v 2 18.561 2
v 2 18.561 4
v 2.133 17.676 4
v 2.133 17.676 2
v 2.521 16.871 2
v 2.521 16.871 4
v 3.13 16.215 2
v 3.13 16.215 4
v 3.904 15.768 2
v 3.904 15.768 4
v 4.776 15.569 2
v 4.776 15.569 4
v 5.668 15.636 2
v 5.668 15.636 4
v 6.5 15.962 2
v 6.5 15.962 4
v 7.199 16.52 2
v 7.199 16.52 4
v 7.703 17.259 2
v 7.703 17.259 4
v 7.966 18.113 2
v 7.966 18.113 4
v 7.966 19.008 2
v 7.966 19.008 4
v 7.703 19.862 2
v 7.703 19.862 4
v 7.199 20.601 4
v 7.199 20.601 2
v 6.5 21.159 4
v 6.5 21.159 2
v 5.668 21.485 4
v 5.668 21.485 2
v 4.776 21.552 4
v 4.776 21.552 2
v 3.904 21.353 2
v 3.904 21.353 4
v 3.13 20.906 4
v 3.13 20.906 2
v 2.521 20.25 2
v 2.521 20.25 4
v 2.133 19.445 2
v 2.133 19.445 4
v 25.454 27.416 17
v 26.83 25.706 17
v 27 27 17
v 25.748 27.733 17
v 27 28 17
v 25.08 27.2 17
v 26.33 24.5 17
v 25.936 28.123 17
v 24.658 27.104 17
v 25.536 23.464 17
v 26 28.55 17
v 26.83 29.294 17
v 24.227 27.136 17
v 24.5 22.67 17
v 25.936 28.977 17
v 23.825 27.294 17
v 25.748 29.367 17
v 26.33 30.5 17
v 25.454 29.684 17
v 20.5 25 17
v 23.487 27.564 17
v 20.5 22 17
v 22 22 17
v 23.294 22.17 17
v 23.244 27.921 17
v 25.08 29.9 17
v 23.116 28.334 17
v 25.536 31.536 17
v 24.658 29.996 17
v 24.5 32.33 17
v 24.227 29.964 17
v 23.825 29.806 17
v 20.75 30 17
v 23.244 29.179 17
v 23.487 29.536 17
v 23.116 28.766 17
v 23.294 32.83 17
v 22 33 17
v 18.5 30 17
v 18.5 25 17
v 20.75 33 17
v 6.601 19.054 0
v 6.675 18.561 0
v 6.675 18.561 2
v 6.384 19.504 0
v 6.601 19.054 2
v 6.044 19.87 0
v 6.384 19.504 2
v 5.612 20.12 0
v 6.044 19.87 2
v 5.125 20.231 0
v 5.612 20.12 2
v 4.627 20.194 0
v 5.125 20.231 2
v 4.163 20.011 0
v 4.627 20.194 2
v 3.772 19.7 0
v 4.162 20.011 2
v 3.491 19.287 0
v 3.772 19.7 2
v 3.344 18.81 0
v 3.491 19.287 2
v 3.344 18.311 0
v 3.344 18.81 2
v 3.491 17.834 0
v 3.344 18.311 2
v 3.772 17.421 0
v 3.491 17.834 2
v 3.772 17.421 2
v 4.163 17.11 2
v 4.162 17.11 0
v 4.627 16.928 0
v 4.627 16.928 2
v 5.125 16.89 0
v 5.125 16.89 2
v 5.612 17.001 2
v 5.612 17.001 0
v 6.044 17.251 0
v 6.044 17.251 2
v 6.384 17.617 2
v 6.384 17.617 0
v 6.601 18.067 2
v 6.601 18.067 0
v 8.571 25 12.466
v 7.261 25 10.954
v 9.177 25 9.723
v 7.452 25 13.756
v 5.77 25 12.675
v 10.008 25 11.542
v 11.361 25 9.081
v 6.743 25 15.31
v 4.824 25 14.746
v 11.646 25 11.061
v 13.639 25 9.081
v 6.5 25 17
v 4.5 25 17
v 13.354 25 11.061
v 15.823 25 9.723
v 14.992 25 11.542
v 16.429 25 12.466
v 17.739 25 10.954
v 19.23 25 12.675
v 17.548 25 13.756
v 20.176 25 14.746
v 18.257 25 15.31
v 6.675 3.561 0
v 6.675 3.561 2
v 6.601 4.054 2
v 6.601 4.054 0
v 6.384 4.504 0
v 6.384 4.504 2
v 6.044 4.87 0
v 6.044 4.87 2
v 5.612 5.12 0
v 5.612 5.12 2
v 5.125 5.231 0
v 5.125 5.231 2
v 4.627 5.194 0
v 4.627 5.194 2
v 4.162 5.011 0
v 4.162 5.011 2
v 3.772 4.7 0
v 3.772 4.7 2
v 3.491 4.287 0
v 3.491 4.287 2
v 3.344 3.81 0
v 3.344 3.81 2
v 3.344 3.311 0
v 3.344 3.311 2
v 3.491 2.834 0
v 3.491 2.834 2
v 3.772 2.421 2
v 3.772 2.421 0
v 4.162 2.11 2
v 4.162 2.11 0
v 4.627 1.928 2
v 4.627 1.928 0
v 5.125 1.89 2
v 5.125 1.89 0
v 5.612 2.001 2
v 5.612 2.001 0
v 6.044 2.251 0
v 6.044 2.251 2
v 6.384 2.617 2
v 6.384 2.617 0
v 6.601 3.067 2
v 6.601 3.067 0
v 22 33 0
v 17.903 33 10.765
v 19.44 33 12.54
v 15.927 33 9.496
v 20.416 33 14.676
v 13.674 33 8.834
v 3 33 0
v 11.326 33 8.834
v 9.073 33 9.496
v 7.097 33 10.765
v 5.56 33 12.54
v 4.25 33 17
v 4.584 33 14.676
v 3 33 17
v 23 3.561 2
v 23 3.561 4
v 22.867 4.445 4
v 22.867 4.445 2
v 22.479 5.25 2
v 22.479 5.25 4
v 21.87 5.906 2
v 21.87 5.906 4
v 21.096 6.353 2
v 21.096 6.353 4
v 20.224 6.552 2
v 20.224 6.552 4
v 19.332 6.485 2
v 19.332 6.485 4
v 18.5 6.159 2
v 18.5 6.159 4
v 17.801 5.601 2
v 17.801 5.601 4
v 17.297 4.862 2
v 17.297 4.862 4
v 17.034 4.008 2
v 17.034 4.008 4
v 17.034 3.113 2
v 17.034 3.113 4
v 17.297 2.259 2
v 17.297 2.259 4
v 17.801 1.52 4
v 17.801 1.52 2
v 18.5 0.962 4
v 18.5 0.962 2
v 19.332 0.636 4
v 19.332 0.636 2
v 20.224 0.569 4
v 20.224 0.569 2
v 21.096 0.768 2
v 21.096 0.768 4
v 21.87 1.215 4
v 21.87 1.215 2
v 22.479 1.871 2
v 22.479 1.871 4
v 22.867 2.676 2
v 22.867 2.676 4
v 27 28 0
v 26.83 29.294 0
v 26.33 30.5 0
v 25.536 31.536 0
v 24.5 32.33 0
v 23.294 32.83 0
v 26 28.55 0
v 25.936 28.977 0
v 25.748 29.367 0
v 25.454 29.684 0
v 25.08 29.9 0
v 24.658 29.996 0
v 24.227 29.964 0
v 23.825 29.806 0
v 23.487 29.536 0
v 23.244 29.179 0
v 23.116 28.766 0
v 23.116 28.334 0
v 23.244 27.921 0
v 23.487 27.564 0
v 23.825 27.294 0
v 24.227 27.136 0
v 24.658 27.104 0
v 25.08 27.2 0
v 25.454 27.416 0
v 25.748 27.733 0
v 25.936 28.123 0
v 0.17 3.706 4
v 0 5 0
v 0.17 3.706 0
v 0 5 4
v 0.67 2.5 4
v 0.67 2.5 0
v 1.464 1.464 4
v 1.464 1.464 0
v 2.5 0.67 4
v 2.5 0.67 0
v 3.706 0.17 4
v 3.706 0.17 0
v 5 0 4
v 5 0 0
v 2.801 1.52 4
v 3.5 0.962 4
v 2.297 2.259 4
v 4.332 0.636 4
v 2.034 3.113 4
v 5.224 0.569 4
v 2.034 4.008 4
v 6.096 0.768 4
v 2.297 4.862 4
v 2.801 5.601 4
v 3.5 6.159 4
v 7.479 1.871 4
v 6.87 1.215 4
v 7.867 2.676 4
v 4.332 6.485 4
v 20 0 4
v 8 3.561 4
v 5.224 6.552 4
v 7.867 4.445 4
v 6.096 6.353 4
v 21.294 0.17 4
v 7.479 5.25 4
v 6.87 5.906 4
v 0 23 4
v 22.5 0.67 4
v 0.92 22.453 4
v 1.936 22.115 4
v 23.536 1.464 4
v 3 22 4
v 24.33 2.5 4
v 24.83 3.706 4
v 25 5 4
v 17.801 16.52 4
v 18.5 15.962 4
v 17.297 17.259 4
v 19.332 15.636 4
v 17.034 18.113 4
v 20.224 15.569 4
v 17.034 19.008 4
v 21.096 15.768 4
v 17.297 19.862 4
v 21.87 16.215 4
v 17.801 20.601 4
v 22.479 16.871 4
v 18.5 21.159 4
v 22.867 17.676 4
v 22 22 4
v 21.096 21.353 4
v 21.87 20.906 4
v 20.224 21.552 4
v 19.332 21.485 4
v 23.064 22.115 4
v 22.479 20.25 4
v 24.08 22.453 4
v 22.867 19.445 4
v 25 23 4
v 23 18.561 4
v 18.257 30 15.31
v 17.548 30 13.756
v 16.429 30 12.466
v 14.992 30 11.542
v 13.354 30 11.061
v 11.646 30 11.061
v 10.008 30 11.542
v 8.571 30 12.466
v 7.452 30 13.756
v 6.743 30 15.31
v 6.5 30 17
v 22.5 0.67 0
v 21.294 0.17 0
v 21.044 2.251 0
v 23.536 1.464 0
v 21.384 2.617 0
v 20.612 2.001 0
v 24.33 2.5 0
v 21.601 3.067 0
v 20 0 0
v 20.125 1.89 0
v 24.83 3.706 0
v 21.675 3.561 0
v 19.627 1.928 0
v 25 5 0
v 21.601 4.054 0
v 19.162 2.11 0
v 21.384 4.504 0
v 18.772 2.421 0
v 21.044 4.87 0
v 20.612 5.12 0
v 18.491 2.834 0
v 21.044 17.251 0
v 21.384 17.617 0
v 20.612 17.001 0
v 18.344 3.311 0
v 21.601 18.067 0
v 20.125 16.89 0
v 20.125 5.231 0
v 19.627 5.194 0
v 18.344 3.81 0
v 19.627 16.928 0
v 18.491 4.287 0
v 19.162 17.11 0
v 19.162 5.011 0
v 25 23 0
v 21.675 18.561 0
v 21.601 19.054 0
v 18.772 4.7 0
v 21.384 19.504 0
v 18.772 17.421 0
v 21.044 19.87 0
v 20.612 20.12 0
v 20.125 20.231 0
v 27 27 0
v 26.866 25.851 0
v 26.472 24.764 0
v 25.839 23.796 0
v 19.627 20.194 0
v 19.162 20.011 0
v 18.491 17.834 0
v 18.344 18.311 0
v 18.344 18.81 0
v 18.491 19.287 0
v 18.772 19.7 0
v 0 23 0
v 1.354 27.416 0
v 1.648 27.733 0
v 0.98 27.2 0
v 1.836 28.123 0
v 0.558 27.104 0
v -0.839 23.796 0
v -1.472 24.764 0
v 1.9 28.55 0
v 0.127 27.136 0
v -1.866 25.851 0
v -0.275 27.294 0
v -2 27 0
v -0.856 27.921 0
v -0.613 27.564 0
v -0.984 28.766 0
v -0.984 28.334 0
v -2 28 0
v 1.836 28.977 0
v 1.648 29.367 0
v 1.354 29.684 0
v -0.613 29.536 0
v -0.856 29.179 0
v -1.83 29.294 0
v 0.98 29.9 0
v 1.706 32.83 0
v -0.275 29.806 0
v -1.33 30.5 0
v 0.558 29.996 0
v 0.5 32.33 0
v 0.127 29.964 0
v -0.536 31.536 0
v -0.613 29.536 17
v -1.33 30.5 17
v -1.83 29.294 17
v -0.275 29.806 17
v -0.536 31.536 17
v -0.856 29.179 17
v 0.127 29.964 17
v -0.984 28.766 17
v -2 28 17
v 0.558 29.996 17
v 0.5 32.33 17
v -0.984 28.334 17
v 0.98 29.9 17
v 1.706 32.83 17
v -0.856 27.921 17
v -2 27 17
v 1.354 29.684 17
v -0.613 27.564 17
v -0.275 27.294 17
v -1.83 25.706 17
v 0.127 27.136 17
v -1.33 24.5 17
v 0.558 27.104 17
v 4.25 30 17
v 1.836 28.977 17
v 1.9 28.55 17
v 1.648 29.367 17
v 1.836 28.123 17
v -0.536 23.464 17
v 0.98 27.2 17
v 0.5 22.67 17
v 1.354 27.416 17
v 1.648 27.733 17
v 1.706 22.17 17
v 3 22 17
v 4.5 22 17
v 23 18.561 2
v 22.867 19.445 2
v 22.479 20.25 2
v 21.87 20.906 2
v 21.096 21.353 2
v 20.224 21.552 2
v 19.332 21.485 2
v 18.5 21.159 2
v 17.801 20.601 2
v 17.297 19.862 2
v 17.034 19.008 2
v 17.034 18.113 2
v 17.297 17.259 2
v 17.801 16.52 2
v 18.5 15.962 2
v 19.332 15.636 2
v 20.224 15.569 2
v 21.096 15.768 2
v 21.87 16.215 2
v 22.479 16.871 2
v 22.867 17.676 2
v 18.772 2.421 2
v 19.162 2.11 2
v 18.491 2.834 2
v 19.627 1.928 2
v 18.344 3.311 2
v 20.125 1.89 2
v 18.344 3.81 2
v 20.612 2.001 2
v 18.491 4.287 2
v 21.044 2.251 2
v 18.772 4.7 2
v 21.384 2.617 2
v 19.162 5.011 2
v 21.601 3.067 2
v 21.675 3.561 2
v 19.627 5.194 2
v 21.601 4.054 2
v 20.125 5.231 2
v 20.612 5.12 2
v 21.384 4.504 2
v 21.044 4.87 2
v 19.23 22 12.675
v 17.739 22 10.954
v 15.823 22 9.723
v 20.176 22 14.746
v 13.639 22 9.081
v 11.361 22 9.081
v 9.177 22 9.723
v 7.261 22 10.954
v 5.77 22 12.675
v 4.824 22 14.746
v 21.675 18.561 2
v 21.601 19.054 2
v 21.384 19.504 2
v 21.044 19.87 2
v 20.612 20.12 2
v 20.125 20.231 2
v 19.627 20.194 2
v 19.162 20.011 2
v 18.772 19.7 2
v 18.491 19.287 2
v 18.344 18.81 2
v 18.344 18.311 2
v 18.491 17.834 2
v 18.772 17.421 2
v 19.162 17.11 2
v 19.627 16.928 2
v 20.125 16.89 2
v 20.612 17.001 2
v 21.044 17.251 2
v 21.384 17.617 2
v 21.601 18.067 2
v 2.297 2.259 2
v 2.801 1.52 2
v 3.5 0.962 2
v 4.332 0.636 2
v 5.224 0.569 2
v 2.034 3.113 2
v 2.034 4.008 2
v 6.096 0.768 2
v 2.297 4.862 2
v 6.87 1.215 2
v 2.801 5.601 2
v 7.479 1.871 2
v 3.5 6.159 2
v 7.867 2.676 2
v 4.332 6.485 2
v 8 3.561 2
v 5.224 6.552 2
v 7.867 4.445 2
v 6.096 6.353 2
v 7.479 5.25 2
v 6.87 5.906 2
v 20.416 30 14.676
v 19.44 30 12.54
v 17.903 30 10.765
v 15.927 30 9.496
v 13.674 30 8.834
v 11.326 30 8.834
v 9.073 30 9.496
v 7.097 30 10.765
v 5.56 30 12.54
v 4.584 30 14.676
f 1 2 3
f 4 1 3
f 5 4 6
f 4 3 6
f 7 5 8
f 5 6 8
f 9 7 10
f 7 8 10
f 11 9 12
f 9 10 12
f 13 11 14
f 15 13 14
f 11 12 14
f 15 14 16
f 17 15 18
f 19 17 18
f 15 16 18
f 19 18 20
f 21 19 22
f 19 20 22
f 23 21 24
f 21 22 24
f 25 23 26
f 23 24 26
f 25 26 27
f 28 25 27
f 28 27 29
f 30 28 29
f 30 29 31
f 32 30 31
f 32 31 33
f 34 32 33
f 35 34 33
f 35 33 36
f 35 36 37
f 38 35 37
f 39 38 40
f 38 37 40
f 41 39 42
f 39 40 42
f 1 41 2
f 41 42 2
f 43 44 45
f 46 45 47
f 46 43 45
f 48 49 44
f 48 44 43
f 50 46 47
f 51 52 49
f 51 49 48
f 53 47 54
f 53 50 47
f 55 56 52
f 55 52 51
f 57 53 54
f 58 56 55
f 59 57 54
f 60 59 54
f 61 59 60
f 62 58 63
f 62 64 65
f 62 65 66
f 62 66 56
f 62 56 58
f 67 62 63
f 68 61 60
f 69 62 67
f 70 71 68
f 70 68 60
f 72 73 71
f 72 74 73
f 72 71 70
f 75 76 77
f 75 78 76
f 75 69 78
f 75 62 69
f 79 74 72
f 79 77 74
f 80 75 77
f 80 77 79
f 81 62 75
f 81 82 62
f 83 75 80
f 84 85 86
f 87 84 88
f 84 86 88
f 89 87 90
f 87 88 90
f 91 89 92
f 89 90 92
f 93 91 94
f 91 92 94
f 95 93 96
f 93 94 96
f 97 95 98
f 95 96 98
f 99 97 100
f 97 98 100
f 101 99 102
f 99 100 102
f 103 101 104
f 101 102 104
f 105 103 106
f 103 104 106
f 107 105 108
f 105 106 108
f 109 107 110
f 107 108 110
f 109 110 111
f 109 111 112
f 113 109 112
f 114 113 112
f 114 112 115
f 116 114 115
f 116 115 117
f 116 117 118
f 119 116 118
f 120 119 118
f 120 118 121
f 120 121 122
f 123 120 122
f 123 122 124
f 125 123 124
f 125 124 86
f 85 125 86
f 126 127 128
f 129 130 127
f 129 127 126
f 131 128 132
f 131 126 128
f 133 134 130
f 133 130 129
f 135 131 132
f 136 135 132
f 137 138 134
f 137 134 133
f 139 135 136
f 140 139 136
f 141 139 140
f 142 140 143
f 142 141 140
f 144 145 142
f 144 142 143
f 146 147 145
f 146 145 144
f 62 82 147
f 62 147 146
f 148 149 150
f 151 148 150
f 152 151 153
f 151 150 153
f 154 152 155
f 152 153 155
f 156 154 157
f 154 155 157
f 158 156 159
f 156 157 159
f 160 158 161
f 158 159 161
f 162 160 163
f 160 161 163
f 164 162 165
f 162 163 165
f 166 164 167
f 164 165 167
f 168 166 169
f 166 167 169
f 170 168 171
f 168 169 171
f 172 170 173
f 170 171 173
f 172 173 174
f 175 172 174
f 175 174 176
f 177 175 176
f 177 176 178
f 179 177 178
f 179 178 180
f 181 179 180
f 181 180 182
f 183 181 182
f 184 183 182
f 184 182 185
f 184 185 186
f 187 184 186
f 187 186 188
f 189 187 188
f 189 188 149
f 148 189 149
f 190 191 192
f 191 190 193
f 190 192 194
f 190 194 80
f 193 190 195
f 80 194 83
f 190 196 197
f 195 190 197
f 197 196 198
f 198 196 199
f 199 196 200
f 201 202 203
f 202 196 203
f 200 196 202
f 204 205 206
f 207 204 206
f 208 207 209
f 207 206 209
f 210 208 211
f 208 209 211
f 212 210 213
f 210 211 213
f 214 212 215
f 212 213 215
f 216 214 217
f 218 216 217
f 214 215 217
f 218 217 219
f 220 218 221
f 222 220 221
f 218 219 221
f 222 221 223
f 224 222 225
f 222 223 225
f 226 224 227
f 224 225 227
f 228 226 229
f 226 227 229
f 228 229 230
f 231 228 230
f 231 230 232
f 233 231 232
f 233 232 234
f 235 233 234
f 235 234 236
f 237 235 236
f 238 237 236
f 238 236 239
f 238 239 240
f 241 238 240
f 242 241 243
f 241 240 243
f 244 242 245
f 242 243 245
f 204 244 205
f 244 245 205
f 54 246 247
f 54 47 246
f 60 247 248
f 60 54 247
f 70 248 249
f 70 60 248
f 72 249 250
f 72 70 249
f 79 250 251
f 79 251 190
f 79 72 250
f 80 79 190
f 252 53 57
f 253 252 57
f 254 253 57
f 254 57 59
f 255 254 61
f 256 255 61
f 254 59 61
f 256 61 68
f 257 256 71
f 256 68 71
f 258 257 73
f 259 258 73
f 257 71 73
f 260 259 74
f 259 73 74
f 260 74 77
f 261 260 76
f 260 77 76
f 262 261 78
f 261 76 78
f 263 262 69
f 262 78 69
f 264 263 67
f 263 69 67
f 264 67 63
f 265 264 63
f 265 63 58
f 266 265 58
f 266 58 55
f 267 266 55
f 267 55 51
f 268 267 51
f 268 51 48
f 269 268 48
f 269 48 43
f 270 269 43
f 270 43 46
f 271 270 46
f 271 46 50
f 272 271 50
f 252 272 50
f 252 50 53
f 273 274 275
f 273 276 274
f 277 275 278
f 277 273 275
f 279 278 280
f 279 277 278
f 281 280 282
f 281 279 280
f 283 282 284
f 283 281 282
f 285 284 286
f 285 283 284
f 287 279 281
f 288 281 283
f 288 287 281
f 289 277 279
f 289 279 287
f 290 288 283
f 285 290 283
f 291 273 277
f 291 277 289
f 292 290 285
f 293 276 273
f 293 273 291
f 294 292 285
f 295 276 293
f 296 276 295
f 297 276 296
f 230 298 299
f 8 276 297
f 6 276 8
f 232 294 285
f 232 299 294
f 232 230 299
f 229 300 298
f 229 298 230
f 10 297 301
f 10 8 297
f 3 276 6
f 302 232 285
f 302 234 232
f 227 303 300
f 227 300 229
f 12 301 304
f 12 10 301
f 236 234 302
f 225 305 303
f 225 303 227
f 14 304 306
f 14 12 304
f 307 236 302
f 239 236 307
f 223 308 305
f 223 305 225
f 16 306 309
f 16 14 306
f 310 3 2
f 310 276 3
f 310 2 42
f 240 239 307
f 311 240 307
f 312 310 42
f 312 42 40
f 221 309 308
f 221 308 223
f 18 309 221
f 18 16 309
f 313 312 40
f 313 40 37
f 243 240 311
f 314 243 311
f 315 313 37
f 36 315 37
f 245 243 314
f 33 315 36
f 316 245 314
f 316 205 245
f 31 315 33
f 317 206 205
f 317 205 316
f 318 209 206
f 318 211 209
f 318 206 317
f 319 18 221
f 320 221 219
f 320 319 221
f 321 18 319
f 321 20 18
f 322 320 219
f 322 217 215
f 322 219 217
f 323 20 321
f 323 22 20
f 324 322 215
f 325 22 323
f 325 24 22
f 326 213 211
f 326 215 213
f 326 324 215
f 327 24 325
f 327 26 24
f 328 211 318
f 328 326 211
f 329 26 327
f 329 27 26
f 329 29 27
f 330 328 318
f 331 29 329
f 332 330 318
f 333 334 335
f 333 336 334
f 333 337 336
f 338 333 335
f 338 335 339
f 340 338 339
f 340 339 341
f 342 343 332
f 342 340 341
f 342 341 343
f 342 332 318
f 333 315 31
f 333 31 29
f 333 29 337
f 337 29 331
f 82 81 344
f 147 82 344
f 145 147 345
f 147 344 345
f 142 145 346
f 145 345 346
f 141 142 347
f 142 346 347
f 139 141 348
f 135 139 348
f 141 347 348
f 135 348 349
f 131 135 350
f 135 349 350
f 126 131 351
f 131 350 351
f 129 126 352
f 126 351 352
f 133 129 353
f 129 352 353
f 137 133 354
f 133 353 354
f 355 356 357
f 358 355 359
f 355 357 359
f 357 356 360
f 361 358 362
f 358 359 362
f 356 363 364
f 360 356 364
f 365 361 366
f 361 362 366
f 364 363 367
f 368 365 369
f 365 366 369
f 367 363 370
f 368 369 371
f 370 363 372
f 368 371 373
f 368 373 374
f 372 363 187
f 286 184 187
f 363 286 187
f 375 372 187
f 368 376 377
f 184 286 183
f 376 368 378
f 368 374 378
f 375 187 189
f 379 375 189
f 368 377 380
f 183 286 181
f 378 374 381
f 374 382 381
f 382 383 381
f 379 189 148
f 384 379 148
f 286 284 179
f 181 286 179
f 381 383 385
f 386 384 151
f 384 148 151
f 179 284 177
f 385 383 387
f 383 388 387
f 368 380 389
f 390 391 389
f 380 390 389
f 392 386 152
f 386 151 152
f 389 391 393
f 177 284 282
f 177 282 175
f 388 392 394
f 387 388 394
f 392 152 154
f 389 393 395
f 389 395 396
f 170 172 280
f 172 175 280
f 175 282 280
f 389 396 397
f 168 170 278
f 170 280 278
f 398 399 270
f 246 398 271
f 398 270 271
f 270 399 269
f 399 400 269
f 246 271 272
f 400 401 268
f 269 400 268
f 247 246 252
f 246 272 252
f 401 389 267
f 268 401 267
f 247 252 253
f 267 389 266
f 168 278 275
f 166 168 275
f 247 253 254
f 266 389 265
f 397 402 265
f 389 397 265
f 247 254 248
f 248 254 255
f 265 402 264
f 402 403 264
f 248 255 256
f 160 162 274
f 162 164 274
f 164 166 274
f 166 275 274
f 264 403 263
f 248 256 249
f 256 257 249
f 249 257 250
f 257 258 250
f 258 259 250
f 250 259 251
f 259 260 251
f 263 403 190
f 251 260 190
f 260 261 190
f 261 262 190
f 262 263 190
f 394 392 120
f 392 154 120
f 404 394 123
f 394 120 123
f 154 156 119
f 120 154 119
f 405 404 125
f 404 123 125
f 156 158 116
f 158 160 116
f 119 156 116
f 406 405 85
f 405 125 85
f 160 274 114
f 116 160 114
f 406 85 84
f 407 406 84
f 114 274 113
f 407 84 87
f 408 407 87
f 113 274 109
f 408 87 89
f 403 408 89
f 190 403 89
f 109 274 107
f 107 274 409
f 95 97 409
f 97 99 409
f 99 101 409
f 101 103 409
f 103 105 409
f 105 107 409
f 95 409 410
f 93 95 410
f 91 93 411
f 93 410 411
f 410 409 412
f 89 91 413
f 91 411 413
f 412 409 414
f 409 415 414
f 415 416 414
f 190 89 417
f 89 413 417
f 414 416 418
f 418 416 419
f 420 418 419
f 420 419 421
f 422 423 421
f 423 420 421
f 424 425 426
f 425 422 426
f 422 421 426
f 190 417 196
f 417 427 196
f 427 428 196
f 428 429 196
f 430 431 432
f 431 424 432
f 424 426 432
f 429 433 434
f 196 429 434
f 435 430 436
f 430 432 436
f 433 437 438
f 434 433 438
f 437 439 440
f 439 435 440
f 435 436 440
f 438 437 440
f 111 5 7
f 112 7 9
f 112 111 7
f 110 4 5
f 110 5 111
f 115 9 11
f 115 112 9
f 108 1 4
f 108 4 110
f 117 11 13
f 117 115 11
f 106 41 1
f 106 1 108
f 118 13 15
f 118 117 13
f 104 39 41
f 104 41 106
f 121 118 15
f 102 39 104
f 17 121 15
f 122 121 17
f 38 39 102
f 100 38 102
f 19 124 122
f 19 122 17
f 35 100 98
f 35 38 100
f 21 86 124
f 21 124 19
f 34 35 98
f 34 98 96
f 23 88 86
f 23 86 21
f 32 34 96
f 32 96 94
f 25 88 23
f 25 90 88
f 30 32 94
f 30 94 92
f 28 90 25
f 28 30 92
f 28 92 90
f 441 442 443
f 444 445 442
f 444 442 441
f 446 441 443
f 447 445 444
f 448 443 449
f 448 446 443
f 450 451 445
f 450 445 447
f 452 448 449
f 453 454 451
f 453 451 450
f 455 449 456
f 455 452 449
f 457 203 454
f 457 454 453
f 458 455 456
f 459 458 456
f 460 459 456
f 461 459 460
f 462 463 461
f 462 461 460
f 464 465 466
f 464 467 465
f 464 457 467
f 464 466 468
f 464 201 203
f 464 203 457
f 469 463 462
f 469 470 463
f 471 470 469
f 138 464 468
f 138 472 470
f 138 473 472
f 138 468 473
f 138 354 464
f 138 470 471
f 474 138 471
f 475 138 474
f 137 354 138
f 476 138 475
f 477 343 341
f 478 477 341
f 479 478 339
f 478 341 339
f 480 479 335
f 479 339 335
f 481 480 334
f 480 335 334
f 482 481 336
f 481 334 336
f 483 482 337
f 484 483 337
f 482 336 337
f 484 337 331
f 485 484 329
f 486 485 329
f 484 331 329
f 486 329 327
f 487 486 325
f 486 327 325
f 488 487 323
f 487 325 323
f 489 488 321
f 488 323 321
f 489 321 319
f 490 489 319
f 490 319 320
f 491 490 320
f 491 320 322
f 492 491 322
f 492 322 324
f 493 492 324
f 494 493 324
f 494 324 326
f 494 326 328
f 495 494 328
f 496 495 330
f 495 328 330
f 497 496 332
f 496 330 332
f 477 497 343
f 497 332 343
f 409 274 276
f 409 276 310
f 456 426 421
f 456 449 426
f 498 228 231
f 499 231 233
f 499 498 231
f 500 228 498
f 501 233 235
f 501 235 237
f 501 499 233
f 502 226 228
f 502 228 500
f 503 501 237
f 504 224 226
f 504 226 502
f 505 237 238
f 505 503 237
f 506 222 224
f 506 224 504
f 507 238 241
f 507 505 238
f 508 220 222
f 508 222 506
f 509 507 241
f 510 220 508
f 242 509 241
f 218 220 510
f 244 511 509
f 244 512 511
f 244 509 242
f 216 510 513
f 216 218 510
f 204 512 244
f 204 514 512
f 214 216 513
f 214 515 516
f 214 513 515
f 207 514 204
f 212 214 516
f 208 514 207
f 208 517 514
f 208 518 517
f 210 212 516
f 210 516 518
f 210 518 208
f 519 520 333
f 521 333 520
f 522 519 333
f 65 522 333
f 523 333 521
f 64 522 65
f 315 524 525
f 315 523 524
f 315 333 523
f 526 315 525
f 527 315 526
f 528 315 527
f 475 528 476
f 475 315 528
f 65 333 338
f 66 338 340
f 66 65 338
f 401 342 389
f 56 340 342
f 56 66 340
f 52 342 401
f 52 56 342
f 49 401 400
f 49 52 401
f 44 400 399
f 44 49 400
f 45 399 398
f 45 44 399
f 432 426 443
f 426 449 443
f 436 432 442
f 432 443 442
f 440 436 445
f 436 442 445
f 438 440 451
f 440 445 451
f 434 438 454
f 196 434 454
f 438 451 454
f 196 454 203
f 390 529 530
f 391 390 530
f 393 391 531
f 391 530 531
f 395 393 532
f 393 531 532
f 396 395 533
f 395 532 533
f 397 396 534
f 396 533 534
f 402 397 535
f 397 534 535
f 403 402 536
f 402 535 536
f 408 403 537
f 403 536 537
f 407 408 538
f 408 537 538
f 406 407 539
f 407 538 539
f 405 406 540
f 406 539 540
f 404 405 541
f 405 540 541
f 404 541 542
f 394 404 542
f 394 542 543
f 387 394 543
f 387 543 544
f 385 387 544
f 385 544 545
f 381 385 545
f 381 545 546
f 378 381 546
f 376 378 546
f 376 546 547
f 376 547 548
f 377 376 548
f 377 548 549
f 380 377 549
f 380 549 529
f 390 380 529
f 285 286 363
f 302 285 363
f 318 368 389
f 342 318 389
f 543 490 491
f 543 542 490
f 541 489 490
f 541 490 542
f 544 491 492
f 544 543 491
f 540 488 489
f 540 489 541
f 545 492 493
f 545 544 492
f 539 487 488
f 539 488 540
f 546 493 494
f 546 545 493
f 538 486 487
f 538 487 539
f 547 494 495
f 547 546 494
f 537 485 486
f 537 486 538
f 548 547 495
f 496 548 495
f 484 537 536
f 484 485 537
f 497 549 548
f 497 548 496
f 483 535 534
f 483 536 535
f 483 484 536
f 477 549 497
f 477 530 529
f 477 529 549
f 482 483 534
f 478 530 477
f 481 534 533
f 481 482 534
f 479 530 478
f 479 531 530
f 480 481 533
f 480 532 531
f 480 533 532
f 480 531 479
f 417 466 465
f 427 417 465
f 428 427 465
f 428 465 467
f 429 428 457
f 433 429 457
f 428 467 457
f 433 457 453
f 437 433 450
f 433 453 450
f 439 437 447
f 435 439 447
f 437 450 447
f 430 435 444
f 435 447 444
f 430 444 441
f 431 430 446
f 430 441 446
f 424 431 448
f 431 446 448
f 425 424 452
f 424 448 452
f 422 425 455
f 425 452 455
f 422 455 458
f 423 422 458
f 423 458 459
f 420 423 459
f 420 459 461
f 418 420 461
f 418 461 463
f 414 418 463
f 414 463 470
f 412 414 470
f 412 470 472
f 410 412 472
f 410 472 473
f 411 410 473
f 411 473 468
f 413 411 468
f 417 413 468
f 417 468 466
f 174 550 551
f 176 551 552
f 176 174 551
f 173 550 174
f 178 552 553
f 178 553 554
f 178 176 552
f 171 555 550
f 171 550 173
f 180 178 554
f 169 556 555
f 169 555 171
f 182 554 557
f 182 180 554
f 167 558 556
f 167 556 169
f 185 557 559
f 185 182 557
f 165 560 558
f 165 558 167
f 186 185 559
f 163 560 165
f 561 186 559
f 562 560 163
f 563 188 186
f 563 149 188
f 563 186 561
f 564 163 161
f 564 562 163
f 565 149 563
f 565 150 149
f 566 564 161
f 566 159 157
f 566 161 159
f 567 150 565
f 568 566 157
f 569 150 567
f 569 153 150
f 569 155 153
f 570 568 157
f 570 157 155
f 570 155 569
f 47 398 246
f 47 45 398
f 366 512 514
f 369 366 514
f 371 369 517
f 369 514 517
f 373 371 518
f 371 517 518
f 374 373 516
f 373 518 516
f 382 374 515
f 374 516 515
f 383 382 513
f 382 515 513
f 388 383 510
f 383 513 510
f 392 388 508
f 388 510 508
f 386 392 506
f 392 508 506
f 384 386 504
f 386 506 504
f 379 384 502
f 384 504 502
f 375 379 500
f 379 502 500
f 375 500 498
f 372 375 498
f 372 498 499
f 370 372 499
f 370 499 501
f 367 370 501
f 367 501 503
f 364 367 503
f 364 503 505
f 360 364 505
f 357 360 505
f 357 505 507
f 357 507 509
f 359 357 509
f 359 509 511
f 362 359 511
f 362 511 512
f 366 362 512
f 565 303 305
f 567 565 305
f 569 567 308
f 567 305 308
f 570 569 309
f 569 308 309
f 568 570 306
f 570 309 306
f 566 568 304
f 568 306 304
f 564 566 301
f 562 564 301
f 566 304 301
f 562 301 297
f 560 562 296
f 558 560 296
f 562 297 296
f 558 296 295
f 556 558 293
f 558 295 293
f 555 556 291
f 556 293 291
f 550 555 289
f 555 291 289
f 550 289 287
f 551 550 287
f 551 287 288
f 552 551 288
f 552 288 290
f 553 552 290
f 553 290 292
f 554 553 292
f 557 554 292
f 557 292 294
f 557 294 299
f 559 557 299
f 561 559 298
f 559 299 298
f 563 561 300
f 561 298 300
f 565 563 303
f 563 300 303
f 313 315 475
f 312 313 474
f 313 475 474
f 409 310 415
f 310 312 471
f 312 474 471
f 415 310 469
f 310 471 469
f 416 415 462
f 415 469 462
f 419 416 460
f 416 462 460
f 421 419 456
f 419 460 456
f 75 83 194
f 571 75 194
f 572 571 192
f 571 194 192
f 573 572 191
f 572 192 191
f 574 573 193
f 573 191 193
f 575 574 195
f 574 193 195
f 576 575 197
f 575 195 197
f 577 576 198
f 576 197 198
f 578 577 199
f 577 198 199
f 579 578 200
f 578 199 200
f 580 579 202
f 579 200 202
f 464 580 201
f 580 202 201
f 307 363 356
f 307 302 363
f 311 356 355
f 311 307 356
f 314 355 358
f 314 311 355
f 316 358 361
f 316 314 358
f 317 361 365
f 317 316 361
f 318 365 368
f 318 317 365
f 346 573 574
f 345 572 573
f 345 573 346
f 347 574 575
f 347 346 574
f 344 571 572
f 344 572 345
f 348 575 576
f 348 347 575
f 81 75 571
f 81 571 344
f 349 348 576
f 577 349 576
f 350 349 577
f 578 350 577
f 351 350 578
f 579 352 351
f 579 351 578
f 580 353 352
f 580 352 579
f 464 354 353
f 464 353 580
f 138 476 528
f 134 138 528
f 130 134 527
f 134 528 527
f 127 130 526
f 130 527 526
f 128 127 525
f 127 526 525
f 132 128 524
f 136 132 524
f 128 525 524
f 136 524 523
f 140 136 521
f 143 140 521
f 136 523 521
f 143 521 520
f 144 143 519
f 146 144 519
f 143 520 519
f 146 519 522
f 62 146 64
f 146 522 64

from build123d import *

# Parameters (mm, degrees)
F0_W      = 25
F0_H      = 33
F1_DEPTH  = 4
F2_R      = 1.675
F3_DEPTH  = 25
F4_W      = 25
F4_H      = 11
F5_DEPTH  = 13
F7_DEPTH  = 9
F8_R      = 8
F9_DEPTH  = 3
F2_R_2    = 3
F10_DEPTH = 2
F11_R     = 5
F12_W     = 11
F12_H     = 17
F13_DEPTH = 2
F14_W     = 11
F14_H     = 17
F15_DEPTH = 2
F16_R     = 1.45
F17_DEPTH = 25
F18_R     = 5
F19_R     = 8.25
F20_DEPTH = 3


with BuildPart() as f1:
    # F0 (on Top) → F1 (new body)
    with BuildSketch(Plane.XY):
        with Locations((12.5, 16.5)):
            Rectangle(F0_W, F0_H)
    extrude(amount=F1_DEPTH)

    # F2 (on face) → F3 (cut)
    with BuildSketch(Plane.XY.offset(4)):
        with BuildLine():
            ThreePointArc((3.325, 18.5605346784), (5, 16.8855346784), (6.675, 18.5605346784))
            ThreePointArc((6.675, 18.5605346784), (5, 20.2355346784), (3.325, 18.5605346784))
        make_face()
        with Locations((20, 18.5605346784)):
            Circle(F2_R)
        with Locations((20, 3.5605346784)):
            Circle(F2_R)
        with Locations((5, 3.5605346784)):
            Circle(F2_R)
    extrude(amount=-F3_DEPTH, mode=Mode.SUBTRACT)

    # F4 (on face) → F5 (join)
    with BuildSketch(Plane.XY.offset(4)):
        with Locations((12.5, 27.5)):
            Rectangle(F4_W, F4_H)
    extrude(amount=F5_DEPTH)

    # F6 (on face) → F7 (cut)
    with BuildSketch(Plane(origin=(0, 33, 0), x_dir=(-1, 0, 0), z_dir=(0, 1, 0))):
        with BuildLine():
            ThreePointArc((-18.5, 17), (-12.5, 11), (-6.5, 17))
            Line((-6.5, 17), (-18.5, 17))
        make_face()
    extrude(amount=-F7_DEPTH, mode=Mode.SUBTRACT)

    # F8 (on face) → F9 (cut)
    with BuildSketch(Plane.XZ.offset(-22)):
        with Locations((12.5, 17)):
            Circle(F8_R)
    extrude(amount=-F9_DEPTH, mode=Mode.SUBTRACT)

    # F2 (on face) → F10 (cut)
    with BuildSketch(Plane.XY.offset(4)):
        with BuildLine():
            ThreePointArc((8, 18.5605346784), (5, 21.5605346784), (2, 18.5605346784))
            ThreePointArc((2, 18.5605346784), (5, 15.5605346784), (8, 18.5605346784))
        make_face()
        with BuildLine():
            ThreePointArc((3.325, 18.5605346784), (5, 20.2355346784), (6.675, 18.5605346784))
            ThreePointArc((6.675, 18.5605346784), (5, 16.8855346784), (3.325, 18.5605346784))
        make_face(mode=Mode.SUBTRACT)
        with Locations((20, 18.5605346784)):
            Circle(F2_R_2)
        with Locations((20, 18.5605346784)):
            Circle(F2_R, mode=Mode.SUBTRACT)
        with Locations((20, 3.5605346784)):
            Circle(F2_R_2)
        with Locations((20, 3.5605346784)):
            Circle(F2_R, mode=Mode.SUBTRACT)
        with Locations((5, 3.5605346784)):
            Circle(F2_R_2)
        with Locations((5, 3.5605346784)):
            Circle(F2_R, mode=Mode.SUBTRACT)
    extrude(amount=-F10_DEPTH, mode=Mode.SUBTRACT)

    # F11
    f11_edges = [f1.edges().sort_by_distance(p)[0] for p in [
        (0, 0, 2),
        (25, 0, 2),
    ]]
    fillet(f11_edges, radius=F11_R)

    # F12 (on face) → F13 (join)
    with BuildSketch(Plane(origin=(0, 0, 0), x_dir=(0, -1, 0), z_dir=(-1, 0, 0))):
        with Locations((-27.5, 8.5)):
            Rectangle(F12_W, F12_H)
    extrude(amount=F13_DEPTH)

    # F14 (on face) → F15 (join)
    with BuildSketch(Plane.YZ.offset(25)):
        with Locations((27.5, 8.5)):
            Rectangle(F14_W, F14_H)
    extrude(amount=F15_DEPTH)

    # F16 (on face) → F17 (cut)
    with BuildSketch(Plane.XY.offset(17)):
        with Locations((0.45, 28.55)):
            Circle(F16_R)
        with Locations((24.55, 28.55)):
            Circle(F16_R)
    extrude(amount=-F17_DEPTH, mode=Mode.SUBTRACT)

    # F18
    f18_edges = [f1.edges().sort_by_distance(p)[0] for p in [
        (-2, 22, 8.5),
        (-2, 33, 8.5),
        (27, 33, 8.5),
        (27, 22, 8.5),
    ]]
    fillet(f18_edges, radius=F18_R)

    # F19 (on face) → F20 (cut)
    with BuildSketch(Plane(origin=(0, 33, 0), x_dir=(-1, 0, 0), z_dir=(0, 1, 0))):
        with Locations((-12.5, 17)):
            Circle(F19_R)
    extrude(amount=-F20_DEPTH, mode=Mode.SUBTRACT)


solid = f1.part
